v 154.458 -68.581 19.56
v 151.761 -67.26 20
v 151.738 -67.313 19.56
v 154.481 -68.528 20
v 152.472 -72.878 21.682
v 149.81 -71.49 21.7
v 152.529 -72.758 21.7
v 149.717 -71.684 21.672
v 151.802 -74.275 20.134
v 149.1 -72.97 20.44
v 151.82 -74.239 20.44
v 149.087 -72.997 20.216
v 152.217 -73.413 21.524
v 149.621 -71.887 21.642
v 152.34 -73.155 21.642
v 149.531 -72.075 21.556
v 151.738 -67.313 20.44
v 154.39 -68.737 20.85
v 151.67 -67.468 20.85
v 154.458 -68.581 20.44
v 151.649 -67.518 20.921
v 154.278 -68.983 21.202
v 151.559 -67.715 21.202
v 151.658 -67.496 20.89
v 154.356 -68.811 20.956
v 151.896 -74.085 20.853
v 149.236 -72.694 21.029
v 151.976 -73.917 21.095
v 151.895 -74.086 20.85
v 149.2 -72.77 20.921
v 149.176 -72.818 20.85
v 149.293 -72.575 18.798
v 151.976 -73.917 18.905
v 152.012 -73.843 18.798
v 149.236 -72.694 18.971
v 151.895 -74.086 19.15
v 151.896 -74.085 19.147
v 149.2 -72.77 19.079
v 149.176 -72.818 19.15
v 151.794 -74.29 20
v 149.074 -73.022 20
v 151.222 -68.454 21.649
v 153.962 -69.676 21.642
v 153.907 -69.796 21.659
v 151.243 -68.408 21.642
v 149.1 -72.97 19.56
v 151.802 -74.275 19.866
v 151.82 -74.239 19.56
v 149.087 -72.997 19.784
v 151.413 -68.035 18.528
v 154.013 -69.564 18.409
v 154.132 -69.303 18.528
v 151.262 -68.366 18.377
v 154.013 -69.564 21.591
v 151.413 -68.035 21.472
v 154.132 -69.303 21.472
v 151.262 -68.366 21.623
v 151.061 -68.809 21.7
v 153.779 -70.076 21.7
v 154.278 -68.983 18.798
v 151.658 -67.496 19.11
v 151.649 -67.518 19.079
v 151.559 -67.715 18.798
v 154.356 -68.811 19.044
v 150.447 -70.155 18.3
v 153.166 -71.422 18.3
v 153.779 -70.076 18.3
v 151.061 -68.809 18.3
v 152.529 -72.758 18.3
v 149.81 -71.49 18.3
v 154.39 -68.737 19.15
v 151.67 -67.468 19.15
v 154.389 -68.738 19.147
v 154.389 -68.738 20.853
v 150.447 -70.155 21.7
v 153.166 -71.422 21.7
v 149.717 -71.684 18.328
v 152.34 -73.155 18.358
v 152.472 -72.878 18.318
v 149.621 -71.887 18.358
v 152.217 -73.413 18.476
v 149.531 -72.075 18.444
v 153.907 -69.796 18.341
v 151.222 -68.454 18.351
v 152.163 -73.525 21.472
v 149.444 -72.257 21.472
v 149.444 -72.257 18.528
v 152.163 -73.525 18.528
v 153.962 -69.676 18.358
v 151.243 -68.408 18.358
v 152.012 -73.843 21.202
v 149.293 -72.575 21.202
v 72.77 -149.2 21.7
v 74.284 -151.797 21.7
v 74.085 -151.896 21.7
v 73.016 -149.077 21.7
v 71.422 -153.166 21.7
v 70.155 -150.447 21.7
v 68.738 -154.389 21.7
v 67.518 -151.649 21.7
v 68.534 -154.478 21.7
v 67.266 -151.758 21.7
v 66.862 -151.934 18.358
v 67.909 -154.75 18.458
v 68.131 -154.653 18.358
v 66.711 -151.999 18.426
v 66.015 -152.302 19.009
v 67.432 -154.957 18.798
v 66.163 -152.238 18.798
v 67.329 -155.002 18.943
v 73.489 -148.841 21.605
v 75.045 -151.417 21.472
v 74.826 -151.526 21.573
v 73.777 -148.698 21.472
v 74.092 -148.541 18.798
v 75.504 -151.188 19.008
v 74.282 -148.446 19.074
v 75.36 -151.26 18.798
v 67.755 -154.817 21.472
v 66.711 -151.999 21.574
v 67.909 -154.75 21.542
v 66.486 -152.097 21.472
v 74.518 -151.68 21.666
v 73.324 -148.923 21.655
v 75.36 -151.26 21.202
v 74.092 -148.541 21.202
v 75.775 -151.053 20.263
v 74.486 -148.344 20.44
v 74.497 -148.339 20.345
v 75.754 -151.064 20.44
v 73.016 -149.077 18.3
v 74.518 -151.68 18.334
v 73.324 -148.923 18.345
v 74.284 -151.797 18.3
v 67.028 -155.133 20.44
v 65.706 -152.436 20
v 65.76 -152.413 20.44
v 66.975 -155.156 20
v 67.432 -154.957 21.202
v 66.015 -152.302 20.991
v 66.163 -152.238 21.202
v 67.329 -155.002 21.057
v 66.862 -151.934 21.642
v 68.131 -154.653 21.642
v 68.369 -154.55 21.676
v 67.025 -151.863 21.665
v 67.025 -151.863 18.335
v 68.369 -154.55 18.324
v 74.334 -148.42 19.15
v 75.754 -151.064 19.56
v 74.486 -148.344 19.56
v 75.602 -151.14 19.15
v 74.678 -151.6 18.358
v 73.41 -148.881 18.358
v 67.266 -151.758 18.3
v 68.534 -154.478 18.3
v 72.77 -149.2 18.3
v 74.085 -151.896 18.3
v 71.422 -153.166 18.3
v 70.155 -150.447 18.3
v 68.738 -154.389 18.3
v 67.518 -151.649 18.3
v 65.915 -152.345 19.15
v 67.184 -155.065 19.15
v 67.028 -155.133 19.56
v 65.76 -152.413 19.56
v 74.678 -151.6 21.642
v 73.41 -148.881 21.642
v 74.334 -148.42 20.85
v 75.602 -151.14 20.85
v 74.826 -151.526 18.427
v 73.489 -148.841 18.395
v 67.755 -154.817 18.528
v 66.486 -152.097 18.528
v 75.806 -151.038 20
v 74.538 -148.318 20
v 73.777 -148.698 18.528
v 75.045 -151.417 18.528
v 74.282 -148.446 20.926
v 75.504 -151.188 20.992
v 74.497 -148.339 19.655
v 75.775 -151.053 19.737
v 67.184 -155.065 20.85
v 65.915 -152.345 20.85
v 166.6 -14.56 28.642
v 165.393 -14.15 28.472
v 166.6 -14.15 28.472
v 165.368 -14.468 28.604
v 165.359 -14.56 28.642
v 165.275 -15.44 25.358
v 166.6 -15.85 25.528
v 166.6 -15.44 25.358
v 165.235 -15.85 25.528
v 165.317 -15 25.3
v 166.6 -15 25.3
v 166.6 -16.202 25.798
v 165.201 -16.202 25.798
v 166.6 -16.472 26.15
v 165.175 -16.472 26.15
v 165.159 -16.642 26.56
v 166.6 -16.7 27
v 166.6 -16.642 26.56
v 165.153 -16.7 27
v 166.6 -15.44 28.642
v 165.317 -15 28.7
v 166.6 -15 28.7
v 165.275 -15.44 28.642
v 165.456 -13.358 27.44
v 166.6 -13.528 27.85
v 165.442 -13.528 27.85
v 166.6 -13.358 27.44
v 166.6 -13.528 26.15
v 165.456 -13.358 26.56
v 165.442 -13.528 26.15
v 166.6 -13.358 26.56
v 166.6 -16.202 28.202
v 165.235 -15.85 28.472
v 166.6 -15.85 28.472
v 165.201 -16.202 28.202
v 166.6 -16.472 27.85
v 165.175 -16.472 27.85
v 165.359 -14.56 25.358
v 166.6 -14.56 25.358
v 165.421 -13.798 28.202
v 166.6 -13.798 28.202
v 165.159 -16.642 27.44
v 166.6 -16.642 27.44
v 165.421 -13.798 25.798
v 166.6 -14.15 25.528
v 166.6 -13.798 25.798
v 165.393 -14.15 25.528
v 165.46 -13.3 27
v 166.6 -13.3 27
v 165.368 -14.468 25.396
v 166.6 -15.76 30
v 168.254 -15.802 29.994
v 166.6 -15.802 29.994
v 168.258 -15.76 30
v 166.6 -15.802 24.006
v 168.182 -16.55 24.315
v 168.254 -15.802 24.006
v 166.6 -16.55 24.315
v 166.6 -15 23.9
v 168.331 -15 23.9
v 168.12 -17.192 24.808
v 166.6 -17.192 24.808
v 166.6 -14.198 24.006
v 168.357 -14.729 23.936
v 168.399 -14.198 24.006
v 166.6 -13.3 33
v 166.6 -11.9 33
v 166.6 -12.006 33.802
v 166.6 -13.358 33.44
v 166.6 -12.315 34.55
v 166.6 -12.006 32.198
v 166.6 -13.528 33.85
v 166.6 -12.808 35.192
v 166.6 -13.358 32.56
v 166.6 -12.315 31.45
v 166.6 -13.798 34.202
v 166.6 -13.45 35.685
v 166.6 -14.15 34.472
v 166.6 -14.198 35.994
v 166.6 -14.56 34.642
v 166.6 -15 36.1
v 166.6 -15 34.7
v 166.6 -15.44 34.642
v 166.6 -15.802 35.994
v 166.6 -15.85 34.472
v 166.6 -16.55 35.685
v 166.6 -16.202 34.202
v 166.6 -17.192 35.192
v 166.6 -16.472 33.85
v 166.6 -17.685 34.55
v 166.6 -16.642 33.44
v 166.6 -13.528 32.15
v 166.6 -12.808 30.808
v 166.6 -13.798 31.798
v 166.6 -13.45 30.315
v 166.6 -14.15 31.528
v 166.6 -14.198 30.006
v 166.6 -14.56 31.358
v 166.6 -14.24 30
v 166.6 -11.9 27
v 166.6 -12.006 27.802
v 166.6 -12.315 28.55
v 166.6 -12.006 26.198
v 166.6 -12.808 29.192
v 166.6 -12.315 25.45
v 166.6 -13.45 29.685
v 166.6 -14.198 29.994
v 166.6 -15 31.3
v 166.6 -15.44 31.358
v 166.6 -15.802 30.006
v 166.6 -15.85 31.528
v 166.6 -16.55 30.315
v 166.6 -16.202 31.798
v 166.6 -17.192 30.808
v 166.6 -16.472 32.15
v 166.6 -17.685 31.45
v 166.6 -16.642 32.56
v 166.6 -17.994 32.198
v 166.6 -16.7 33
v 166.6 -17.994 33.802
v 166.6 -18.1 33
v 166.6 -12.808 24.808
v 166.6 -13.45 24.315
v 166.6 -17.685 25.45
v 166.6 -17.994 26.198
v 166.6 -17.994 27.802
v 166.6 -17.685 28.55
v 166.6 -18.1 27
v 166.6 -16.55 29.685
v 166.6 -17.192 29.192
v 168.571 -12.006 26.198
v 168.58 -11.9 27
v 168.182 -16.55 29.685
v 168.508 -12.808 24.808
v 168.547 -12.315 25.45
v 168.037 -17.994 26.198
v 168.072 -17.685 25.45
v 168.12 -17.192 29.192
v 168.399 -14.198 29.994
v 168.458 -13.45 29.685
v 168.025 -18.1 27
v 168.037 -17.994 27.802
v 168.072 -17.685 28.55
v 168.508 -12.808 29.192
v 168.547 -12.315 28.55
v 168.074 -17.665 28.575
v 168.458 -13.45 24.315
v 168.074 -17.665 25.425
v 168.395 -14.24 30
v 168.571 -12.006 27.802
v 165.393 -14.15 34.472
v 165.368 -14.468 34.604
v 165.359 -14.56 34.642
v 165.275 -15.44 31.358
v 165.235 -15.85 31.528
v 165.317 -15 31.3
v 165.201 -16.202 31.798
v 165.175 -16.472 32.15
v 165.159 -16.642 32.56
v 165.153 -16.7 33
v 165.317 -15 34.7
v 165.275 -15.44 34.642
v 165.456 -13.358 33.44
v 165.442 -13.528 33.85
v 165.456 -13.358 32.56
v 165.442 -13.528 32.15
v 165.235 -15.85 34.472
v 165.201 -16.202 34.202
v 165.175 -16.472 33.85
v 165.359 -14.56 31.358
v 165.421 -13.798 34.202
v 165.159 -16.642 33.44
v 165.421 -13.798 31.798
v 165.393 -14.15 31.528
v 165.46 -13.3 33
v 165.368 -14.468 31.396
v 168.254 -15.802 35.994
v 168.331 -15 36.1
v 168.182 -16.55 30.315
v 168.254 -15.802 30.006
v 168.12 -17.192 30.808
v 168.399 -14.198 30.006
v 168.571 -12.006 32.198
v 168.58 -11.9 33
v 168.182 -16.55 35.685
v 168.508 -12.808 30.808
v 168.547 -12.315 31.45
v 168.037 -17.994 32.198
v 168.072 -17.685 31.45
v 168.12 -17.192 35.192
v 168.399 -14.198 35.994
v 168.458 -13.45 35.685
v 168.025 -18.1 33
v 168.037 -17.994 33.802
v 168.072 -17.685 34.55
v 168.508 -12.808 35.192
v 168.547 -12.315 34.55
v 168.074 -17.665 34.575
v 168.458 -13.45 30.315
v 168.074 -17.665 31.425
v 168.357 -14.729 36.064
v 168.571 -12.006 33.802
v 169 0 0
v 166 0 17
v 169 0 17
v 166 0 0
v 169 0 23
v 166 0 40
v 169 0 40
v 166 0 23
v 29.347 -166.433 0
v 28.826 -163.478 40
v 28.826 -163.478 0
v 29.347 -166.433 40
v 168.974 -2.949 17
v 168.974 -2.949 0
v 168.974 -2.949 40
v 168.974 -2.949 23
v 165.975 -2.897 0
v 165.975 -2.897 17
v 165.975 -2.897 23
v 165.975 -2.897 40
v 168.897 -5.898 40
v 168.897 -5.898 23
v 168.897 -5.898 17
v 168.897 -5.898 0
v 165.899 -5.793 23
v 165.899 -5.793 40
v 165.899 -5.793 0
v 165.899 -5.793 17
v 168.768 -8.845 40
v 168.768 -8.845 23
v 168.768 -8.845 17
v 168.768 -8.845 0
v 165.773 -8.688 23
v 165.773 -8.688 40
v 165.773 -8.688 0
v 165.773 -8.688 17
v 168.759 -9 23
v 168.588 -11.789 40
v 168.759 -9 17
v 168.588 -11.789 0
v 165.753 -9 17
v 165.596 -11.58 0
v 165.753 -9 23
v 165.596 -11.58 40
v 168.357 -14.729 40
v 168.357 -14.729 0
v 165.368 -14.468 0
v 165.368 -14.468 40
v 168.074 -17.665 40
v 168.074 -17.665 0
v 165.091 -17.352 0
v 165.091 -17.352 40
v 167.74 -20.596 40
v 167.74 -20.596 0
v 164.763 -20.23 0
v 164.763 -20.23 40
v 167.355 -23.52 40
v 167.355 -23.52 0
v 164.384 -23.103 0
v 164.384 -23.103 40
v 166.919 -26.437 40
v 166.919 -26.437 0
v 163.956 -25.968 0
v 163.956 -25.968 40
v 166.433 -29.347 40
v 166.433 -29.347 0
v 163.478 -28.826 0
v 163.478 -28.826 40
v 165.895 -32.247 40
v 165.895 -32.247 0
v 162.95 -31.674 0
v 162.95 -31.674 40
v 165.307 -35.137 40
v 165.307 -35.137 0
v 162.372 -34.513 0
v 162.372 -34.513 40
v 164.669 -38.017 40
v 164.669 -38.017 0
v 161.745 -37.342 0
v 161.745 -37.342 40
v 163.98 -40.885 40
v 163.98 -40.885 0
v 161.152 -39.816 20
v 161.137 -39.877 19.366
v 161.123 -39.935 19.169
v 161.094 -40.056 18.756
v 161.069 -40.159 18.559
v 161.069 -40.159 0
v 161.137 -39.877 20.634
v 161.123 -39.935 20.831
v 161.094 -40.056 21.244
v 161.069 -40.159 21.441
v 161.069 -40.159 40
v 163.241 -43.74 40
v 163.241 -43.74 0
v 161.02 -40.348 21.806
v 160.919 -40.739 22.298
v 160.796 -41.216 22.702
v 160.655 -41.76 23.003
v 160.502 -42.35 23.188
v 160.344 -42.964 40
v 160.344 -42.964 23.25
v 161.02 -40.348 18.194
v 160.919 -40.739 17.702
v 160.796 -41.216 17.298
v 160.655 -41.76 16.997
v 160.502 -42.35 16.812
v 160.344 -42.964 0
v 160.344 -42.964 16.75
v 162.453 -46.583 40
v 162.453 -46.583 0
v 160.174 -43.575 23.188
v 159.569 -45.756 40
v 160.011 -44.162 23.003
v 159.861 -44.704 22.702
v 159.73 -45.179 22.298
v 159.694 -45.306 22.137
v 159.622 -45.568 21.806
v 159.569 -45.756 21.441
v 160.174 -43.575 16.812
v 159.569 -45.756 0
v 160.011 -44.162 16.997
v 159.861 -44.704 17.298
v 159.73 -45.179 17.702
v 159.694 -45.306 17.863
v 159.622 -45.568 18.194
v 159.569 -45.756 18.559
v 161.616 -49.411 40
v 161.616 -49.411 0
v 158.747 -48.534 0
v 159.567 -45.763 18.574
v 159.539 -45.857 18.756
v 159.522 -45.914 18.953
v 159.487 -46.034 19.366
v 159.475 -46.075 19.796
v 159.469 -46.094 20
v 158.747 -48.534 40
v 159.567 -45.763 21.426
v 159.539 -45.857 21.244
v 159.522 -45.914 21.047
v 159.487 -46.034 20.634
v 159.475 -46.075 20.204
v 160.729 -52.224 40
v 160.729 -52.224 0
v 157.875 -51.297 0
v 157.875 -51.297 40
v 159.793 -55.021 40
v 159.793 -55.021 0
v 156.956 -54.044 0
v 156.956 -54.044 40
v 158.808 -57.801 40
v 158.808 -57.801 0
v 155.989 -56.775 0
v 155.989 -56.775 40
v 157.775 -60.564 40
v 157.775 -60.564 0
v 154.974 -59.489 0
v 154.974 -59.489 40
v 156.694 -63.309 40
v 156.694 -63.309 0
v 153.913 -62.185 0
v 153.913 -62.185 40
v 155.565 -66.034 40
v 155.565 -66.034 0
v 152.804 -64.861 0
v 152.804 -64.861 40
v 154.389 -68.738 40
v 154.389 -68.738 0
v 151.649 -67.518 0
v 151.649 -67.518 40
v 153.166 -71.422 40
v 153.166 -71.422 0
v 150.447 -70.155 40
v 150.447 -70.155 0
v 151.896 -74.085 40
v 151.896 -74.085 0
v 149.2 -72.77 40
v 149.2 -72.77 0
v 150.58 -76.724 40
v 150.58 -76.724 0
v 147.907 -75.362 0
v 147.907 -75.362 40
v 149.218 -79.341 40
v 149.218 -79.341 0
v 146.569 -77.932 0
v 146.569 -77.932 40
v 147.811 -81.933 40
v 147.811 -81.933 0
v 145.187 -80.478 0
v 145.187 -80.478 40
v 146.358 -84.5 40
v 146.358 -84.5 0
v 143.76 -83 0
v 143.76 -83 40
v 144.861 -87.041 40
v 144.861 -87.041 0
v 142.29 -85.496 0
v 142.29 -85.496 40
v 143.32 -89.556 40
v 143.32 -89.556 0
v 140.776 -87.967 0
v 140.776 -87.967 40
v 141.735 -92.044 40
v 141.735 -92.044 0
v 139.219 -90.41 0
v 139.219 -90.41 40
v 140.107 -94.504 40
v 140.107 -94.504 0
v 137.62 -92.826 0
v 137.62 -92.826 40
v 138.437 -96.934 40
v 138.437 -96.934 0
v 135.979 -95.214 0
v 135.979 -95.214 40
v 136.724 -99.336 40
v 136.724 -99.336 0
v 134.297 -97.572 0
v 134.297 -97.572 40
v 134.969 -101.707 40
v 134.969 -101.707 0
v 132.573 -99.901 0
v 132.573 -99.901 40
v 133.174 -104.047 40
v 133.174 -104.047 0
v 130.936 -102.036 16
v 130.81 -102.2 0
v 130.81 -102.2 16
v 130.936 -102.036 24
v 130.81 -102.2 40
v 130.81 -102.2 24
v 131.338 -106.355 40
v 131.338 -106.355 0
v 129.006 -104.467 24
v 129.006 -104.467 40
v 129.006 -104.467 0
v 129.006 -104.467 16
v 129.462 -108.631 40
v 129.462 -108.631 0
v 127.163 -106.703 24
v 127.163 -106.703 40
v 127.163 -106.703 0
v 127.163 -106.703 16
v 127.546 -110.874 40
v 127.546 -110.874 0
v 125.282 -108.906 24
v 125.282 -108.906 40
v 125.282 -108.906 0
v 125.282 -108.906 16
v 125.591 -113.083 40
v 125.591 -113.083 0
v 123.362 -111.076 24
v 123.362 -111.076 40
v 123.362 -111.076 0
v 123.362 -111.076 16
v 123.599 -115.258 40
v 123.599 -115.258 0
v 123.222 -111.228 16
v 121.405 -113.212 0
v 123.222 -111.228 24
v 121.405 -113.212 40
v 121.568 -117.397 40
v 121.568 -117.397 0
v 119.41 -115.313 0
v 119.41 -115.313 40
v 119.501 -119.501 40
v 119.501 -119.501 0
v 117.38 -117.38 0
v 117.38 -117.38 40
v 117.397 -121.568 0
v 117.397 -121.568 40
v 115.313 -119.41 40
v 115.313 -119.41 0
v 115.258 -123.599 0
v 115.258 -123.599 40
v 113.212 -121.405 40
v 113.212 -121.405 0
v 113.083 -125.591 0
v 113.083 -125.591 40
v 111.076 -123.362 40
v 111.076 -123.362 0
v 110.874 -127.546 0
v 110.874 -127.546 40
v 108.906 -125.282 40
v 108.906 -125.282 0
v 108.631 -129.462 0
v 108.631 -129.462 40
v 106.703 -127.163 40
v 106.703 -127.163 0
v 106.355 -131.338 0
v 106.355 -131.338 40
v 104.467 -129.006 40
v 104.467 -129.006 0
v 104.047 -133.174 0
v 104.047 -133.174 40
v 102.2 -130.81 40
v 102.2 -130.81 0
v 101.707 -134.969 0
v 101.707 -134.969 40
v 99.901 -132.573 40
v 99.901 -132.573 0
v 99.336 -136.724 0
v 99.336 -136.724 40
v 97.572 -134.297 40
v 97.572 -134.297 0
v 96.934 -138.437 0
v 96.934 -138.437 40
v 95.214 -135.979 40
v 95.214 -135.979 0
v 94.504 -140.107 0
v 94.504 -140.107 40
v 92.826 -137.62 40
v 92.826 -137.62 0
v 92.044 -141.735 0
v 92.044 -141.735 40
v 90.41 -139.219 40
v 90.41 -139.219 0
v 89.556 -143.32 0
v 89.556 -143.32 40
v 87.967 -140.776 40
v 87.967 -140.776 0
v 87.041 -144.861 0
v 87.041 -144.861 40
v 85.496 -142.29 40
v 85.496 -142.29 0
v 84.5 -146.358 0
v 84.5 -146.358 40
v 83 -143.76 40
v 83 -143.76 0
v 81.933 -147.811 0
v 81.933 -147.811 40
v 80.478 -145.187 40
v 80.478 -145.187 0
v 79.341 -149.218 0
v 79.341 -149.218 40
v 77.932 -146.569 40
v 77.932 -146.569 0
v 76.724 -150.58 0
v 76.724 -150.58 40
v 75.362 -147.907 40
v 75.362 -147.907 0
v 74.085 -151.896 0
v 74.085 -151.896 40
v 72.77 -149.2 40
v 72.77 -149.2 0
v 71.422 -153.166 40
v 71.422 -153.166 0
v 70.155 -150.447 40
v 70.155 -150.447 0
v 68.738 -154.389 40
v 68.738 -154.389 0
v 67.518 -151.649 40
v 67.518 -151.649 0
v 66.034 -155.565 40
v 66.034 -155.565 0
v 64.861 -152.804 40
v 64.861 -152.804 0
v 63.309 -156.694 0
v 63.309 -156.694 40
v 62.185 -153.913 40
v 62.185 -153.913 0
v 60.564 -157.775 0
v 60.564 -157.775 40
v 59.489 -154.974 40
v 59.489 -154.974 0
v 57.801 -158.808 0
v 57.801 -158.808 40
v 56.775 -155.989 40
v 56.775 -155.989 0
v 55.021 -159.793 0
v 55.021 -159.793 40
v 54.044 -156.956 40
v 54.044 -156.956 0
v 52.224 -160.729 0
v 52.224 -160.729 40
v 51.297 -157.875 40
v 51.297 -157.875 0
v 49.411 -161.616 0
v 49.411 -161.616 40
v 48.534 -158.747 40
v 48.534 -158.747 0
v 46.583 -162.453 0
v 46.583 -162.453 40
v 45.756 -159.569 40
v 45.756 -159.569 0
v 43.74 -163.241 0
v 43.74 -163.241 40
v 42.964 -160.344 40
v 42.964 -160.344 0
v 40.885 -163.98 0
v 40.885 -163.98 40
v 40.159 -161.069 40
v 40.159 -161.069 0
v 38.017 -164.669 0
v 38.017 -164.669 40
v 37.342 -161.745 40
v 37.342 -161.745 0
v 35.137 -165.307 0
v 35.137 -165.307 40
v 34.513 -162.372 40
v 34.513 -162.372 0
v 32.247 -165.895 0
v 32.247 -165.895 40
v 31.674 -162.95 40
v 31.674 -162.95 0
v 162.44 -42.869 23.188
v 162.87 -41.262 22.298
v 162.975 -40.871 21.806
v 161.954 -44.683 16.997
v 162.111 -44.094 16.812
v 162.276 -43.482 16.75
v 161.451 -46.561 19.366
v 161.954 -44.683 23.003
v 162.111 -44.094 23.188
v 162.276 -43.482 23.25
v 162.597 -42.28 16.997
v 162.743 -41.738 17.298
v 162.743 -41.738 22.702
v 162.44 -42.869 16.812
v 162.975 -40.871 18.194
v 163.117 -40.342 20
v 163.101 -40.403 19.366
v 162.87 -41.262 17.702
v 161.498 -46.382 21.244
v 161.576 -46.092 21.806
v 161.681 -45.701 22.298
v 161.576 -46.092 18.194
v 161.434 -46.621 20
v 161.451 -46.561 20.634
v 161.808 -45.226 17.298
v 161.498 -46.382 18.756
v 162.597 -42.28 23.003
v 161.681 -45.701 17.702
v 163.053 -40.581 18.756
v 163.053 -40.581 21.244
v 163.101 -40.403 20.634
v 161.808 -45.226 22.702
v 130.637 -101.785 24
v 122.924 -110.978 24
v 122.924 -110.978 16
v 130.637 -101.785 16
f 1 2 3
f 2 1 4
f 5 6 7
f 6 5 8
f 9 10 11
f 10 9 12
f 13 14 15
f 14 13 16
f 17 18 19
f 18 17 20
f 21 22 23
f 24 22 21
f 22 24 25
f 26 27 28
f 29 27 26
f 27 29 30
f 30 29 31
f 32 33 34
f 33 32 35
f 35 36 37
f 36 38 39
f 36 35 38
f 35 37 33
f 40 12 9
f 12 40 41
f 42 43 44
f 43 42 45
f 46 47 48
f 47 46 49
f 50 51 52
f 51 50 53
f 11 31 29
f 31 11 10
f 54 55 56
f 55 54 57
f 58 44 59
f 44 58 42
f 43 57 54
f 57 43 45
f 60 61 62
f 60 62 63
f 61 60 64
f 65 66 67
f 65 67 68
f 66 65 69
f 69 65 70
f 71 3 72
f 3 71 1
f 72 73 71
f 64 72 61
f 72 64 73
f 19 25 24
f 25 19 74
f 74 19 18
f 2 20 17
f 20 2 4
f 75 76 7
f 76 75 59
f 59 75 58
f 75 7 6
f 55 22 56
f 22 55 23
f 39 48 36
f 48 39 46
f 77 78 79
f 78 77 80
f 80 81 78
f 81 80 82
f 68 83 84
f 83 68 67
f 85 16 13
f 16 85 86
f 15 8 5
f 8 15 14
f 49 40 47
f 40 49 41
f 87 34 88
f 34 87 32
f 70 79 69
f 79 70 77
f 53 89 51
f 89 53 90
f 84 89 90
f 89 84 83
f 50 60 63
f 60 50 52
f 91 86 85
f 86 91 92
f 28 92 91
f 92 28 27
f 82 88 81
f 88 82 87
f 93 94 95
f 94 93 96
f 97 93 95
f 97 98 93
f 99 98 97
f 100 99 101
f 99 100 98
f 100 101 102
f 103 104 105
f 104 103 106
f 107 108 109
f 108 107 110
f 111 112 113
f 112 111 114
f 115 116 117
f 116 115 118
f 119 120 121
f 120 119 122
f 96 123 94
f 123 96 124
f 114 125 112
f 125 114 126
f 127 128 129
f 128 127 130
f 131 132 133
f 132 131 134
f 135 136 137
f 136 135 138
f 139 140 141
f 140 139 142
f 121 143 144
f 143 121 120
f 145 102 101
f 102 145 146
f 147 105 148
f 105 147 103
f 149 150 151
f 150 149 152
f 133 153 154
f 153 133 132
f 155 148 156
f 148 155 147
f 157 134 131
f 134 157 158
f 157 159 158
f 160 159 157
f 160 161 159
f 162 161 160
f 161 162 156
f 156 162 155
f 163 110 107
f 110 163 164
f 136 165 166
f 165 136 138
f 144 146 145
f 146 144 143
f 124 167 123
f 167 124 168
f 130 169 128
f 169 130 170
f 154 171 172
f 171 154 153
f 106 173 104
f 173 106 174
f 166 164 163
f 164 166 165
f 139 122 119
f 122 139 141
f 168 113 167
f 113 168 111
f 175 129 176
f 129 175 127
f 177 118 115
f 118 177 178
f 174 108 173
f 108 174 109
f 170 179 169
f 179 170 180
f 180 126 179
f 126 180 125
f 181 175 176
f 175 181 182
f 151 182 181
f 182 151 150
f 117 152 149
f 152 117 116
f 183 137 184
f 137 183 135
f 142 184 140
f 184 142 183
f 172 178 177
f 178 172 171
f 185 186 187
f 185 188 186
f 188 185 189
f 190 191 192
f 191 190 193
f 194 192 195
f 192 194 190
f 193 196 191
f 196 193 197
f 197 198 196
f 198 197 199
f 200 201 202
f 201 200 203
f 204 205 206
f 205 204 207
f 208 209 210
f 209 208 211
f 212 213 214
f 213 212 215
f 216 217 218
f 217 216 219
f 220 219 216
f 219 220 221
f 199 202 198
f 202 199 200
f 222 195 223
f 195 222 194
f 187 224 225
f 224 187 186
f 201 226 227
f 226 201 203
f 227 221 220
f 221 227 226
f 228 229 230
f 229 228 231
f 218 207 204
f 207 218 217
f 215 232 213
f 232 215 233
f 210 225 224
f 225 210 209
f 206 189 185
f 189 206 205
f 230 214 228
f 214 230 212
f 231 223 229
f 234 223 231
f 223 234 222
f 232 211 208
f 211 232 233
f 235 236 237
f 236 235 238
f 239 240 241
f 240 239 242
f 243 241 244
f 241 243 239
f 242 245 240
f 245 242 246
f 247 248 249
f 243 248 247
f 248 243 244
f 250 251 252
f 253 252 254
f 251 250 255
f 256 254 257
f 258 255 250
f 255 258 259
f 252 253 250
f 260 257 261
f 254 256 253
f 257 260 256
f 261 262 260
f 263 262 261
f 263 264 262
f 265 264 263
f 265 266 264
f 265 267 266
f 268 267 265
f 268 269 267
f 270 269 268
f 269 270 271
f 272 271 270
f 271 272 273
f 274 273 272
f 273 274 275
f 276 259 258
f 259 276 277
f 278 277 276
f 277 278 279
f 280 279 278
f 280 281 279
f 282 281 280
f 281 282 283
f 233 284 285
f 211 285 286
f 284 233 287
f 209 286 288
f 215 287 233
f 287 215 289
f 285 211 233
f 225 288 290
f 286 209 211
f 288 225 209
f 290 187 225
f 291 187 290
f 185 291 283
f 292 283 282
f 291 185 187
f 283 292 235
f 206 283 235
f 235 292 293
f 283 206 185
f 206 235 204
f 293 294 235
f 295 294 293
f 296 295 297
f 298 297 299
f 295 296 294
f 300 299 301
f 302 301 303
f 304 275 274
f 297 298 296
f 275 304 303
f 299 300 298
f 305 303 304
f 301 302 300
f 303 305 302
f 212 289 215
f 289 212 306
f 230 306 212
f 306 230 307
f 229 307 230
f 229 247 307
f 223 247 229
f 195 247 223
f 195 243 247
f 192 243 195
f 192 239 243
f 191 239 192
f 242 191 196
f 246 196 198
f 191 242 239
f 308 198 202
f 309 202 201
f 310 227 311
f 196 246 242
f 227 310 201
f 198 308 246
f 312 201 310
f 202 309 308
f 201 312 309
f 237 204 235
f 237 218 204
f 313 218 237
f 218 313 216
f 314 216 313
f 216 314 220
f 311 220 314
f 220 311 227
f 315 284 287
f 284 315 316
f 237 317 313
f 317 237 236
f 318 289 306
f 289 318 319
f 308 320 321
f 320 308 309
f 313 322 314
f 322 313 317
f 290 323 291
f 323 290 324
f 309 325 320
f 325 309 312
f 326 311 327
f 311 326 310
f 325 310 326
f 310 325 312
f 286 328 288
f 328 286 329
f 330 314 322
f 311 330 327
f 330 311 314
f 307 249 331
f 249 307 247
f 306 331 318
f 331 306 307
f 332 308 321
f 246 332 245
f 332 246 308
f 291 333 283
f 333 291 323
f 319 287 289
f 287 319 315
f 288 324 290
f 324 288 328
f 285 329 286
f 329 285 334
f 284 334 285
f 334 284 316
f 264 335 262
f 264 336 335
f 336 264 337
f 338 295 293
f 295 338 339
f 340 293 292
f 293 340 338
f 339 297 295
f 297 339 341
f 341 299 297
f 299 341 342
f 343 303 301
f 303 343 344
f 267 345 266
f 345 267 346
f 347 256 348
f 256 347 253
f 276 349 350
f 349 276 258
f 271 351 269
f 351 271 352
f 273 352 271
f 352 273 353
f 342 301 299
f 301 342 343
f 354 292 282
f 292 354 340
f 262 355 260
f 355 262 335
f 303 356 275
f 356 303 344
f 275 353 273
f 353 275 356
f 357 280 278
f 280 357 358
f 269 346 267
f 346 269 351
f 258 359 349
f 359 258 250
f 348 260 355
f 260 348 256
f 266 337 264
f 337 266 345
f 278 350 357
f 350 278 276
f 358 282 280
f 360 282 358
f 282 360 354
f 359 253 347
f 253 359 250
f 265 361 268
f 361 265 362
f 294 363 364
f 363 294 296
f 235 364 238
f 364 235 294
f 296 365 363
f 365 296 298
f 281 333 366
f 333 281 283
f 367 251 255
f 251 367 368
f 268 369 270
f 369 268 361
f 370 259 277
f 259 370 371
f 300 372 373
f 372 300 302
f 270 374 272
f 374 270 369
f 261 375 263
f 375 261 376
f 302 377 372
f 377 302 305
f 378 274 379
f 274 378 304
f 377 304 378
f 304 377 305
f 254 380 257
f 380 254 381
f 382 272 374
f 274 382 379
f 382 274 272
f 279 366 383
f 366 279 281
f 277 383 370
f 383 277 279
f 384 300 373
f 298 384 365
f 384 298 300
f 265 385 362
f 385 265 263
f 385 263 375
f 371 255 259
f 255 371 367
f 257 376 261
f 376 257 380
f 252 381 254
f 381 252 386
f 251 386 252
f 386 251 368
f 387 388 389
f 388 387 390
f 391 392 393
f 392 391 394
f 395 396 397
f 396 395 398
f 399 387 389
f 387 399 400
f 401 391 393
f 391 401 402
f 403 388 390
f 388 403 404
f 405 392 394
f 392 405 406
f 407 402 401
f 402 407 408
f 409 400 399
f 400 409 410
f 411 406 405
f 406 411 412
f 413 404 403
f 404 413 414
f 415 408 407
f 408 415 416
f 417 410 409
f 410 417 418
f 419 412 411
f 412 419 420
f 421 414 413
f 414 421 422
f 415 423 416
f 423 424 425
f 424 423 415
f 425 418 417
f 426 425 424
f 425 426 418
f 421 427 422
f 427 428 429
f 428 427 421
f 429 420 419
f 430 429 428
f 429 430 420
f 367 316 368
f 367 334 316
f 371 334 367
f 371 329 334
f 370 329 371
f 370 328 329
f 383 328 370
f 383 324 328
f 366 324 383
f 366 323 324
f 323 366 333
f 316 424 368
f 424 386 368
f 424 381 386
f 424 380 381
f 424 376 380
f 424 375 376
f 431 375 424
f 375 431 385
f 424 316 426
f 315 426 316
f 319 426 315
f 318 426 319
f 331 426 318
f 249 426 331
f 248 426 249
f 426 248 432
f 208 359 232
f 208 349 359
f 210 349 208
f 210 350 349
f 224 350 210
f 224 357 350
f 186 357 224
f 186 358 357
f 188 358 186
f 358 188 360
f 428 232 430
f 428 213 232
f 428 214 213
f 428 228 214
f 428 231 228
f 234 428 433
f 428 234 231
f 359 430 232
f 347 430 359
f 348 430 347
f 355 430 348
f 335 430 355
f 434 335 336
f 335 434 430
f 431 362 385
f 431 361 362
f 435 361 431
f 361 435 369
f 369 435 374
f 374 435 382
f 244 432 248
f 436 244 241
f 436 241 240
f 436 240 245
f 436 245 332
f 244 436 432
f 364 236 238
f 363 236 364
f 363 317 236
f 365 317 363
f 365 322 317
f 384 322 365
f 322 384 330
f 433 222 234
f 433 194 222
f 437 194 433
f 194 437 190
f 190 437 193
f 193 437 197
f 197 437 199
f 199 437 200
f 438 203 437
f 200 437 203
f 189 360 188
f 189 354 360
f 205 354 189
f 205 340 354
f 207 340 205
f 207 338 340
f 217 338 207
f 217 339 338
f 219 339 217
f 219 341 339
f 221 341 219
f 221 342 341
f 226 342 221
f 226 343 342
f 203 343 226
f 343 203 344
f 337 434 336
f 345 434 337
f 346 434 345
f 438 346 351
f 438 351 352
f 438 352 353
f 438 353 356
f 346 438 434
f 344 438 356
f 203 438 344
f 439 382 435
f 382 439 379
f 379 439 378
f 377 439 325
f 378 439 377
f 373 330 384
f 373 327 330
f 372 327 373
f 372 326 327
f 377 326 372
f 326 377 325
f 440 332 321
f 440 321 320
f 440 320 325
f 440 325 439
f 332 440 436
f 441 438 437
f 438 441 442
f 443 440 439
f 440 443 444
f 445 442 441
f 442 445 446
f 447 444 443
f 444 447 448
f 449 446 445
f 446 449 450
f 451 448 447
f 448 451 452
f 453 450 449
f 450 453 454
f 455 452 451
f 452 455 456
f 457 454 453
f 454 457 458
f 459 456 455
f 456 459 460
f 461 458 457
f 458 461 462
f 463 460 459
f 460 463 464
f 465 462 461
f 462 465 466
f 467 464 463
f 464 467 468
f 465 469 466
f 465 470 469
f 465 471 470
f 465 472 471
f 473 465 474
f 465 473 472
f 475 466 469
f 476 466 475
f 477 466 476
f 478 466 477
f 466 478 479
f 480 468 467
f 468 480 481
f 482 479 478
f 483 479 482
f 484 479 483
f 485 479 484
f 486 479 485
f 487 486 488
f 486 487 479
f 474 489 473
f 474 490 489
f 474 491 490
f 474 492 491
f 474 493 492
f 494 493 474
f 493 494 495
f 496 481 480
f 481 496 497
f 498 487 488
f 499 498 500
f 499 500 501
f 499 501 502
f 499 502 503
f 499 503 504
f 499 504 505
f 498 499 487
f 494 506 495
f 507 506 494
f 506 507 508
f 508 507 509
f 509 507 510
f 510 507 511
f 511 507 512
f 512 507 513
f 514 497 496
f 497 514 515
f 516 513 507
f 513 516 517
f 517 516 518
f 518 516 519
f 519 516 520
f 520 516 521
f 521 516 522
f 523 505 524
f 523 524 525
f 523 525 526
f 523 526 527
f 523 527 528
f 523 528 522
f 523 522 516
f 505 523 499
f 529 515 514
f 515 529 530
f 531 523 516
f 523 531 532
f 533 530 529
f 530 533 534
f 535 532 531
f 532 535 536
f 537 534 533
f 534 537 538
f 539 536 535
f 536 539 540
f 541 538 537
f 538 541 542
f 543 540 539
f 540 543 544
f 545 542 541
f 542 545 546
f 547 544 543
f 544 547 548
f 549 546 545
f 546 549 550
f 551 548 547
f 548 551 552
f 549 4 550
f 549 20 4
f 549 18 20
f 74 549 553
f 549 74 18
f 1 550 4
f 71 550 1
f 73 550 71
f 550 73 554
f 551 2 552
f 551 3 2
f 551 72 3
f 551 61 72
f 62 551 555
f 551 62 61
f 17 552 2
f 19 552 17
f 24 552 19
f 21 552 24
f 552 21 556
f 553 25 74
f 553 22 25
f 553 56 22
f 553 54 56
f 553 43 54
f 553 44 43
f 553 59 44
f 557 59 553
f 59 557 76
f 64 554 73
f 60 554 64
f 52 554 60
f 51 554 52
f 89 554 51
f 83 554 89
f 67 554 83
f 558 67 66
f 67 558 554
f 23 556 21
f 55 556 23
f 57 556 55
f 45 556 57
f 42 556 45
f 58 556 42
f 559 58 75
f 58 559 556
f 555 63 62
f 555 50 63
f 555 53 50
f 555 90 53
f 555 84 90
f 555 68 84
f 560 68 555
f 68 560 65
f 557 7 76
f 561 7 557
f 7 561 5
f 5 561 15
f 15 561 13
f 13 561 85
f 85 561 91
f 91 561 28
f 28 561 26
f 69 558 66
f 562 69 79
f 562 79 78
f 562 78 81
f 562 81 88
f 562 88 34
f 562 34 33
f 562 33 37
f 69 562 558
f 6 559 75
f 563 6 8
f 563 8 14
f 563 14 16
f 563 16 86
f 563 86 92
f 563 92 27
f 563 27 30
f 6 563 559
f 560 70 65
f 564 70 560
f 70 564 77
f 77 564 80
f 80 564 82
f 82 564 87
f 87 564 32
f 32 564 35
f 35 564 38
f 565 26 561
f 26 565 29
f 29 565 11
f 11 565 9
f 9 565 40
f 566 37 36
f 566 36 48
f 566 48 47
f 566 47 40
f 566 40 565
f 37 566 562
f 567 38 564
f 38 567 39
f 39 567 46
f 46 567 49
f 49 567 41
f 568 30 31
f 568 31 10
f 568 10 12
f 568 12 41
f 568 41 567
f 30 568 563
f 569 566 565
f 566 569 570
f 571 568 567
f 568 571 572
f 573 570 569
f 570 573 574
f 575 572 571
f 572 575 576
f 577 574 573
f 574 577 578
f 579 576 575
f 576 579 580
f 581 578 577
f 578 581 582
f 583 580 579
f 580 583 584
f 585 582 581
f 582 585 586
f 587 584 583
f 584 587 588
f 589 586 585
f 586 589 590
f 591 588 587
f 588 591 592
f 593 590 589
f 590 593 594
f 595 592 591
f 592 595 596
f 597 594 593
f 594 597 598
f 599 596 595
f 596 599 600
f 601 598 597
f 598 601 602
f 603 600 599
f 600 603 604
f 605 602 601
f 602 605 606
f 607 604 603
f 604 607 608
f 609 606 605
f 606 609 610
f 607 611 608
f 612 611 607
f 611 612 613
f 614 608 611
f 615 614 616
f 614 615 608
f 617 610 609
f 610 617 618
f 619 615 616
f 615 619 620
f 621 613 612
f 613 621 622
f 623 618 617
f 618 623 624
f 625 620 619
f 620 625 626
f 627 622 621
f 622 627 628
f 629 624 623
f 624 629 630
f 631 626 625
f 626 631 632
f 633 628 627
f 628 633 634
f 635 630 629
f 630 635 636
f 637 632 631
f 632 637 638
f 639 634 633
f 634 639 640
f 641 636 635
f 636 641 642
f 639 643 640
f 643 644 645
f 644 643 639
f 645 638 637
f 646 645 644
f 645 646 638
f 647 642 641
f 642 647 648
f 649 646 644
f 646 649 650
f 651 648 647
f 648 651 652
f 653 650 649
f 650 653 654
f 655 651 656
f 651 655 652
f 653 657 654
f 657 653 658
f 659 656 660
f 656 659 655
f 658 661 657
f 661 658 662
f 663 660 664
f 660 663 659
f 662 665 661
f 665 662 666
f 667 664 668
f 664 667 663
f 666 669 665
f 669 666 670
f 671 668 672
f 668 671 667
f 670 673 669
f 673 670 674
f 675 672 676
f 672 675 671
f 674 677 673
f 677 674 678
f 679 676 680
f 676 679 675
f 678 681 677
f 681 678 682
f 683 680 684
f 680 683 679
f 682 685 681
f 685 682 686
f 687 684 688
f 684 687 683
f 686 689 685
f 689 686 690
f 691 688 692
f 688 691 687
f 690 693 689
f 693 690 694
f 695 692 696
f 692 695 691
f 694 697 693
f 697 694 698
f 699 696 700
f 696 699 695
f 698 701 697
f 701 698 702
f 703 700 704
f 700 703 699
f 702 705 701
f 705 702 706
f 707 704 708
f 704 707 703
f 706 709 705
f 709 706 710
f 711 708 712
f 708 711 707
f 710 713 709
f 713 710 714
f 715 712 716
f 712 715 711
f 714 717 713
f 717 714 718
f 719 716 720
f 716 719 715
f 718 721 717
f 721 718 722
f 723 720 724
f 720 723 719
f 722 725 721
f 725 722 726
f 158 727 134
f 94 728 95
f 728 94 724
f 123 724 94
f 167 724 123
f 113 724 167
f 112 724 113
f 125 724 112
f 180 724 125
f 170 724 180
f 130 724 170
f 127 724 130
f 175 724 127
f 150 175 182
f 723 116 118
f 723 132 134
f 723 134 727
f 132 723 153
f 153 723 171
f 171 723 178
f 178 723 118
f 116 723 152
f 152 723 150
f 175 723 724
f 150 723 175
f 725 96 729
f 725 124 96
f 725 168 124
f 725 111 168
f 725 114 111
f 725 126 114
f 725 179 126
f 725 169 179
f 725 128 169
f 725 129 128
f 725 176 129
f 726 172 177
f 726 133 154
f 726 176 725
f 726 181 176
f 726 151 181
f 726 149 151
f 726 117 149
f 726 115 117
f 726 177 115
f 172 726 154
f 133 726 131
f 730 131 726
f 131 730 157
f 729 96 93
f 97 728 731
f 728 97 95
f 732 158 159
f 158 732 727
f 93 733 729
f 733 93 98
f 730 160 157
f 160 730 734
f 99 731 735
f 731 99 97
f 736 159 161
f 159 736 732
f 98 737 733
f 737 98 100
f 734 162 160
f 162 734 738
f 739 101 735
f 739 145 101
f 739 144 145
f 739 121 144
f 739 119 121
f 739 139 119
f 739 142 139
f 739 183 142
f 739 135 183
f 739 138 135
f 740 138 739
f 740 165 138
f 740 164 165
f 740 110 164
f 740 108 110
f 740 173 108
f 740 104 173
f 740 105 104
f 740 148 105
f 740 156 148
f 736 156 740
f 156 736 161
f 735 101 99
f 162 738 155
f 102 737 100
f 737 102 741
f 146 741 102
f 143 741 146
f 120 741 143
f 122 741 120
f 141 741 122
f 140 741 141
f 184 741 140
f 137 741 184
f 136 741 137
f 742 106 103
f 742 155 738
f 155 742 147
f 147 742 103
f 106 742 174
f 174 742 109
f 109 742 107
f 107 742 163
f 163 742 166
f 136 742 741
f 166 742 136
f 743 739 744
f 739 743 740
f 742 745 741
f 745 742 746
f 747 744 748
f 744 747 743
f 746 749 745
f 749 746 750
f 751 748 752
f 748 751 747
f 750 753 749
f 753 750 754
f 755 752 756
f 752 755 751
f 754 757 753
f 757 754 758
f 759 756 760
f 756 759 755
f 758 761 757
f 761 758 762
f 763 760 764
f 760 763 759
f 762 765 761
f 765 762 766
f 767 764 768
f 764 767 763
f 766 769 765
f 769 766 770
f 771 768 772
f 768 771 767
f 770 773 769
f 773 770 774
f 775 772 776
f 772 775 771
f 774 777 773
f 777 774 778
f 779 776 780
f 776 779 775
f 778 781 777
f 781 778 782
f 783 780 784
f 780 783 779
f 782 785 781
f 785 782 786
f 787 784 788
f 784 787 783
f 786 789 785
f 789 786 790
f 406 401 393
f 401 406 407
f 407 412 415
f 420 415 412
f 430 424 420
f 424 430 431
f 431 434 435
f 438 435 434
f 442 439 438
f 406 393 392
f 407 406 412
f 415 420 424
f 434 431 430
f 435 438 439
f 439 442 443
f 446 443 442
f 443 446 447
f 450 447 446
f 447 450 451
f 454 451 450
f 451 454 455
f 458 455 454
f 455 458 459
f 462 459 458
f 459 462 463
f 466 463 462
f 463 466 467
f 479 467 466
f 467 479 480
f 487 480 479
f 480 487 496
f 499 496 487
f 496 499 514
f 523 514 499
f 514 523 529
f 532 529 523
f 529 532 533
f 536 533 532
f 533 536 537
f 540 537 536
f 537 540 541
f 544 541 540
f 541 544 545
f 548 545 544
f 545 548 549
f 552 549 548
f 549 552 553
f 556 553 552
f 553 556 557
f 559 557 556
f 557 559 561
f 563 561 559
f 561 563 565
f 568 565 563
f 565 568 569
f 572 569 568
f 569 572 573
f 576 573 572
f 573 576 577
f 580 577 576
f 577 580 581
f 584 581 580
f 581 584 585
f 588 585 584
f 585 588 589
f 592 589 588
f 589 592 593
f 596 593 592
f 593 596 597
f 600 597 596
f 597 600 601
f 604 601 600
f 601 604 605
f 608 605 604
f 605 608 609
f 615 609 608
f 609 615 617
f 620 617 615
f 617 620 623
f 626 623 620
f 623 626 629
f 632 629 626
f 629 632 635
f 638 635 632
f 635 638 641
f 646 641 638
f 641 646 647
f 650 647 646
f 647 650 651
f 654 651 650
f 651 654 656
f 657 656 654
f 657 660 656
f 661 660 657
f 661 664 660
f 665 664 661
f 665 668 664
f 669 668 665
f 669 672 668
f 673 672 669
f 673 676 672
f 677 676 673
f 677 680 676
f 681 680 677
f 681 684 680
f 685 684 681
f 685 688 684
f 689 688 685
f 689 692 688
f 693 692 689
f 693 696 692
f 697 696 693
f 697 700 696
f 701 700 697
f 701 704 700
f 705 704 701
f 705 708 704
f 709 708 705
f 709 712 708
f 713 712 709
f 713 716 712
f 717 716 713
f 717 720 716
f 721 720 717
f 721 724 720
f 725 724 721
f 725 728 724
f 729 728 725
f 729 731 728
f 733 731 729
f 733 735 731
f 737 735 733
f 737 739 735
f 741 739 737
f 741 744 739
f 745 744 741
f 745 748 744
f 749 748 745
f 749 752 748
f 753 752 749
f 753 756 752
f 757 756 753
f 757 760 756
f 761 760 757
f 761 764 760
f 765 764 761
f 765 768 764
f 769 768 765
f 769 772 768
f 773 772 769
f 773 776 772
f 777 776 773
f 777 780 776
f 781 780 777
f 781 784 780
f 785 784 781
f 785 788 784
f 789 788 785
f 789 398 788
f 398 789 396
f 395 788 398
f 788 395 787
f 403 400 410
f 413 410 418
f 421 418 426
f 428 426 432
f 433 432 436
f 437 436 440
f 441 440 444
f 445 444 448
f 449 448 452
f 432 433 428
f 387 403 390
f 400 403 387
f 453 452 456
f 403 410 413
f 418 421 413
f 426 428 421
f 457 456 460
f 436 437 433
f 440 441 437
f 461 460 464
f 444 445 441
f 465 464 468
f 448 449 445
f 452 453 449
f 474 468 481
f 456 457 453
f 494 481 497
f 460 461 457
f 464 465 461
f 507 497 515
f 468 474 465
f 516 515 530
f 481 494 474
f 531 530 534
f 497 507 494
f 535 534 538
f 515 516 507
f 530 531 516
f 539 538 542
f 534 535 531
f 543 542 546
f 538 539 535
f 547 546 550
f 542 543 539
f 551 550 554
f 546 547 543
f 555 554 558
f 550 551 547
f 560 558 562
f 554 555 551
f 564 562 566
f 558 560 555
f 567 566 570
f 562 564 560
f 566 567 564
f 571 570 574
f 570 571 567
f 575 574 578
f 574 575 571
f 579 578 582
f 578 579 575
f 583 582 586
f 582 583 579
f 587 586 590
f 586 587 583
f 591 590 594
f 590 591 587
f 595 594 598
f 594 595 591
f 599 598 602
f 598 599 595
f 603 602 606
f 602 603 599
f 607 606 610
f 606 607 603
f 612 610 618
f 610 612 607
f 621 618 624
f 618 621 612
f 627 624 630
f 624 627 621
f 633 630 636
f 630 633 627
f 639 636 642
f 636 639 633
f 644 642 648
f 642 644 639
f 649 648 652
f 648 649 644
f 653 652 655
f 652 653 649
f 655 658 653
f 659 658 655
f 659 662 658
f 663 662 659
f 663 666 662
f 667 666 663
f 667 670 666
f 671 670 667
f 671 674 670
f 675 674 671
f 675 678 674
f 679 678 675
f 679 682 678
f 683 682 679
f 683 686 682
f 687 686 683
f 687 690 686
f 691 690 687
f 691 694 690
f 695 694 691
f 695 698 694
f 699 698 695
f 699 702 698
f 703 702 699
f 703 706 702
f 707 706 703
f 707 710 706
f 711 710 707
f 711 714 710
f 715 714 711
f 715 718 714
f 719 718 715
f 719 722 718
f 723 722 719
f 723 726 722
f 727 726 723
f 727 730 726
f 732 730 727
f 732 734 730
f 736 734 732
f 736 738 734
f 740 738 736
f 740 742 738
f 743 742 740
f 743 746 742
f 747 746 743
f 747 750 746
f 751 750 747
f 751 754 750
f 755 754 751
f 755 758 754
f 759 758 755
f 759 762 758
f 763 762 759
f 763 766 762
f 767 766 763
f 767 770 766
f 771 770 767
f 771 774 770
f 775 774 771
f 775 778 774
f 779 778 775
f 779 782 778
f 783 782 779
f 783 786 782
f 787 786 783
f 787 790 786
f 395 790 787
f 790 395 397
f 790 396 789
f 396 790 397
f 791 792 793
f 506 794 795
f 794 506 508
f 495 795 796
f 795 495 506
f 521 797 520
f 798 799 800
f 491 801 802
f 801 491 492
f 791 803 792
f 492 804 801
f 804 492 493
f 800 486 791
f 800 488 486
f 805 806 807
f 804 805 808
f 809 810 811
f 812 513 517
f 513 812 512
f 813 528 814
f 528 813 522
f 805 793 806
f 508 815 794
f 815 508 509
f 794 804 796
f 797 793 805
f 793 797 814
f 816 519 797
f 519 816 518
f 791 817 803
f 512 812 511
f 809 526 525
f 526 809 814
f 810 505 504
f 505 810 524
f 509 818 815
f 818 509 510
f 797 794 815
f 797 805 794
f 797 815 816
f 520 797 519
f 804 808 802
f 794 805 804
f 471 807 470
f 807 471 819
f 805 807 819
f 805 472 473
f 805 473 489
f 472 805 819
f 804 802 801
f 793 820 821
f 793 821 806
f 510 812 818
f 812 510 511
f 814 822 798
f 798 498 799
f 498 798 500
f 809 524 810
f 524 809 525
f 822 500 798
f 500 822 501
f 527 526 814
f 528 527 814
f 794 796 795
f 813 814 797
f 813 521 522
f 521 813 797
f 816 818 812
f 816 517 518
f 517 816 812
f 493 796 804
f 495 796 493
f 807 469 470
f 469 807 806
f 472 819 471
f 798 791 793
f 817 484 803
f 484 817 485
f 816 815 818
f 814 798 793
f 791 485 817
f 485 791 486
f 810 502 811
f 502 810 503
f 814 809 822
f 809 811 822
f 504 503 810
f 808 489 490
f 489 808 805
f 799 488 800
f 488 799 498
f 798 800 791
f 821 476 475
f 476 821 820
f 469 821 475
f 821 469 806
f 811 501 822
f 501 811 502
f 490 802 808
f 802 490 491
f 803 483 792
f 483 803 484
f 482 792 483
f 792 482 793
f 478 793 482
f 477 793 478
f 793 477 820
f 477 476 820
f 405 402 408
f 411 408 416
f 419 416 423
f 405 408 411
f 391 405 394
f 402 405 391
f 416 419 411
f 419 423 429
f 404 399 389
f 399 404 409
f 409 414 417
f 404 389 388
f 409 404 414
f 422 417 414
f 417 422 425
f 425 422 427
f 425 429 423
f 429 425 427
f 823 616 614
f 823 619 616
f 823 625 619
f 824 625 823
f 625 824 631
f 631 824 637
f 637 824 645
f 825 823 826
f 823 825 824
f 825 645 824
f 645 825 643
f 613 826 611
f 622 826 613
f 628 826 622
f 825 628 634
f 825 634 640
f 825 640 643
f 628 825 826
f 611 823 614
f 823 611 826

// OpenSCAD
// file: robot_bumper_left.scad
// =====================================================================
//  robot base :: front bumper, LEFT half 0 .. +80 deg (print 1; right half = mirror)
//  Band r 166 .. 169, z 22 .. 62 (the legacy model's front half-ring band).
//    - 2 slots (3.4 x 10.4, long along X) at 25 / 65 deg, z 42 for radial M3 shoulder screws
//    - spring seat d 6.5 x 2 deep (radial) on the inner face at 15 deg, z 42
//    - switch strike pad on the inner face at 40 deg (12 tangential x 8 tall, 0.5 proud: 0.1 off the switch lever tip at rest)
//    - ToF window 18 x 6 at 0 deg split across both halves (9 per half), z 42
//    - splice plate screws: 2x M3 (z 49 / 55) at y +15, counterbored 6.2 x 2 on the outer face,
//      M3 along X into robot_bumper_splice (M3x8).
//  Print orientation: standing on its bottom edge (band vertical), no supports.
//  robot_bumper_left()  robot frame.   NOTE: the lid wall needs a ToF window and a relief for
//  the splice plate at 0 deg (see report).
// =====================================================================
include <../lib/params.scad>
include <../lib/robot_params.scad>

rbb_ri = rb_bumper_r[0];  rbb_ro = rb_bumper_r[1];
rbb_z0 = rb_bumper_z[0];  rbb_z1 = rb_bumper_z[1];
rbb_mid = rb_bumper_mid_z;
rbb_slot_len = rb_bumper_travel + 6.4;
rbb_splice_y = 15;  rbb_splice_z = [49, 55];

module rbb_left_body() {
    difference() {
        rotate_extrude(angle = rb_bumper_ang, $fn = 360)
            translate([rbb_ri, rbb_z0]) square([rbb_ro - rbb_ri, rbb_z1 - rbb_z0]);
        // M3 shoulder-screw slots (hull of 2 radial cylinders, ends along X)
        for (a = [25, 65]) {
            pt = rbb_ro * [cos(a), sin(a)];
            hull() for (s = [-1, 1])
                translate([pt[0] + s * (rbb_slot_len - 3.4) / 2, pt[1], rbb_mid])
                    rotate([0, 90, a]) translate([0, 0, -8]) cylinder(h = 16, d = 3.4, $fn = 24);
        }
        // spring seat (radial pocket on the inner face)
        rotate([0, 0, 15]) translate([rbb_ri - 1, 0, rbb_mid]) rotate([0, 90, 0]) cylinder(h = 3, d = 6.5, $fn = 32);
        // ToF window half
        translate([rbb_ri - 1, -0.01, rbb_mid - 3]) cube([rbb_ro - rbb_ri + 2, 9.01, 6]);
        // splice screws (counterbored from outside)
        for (z = rbb_splice_z) translate([0, rbb_splice_y, z]) rotate([0, 90, 0]) {
            translate([0, 0, rbb_ri - 2]) cylinder(h = 6, d = m3_clear, $fn = 24);
            translate([0, 0, 166.6]) cylinder(h = 6, d = 6.2, $fn = 24);
        }
    }
    // strike pad
    intersection() {
        rotate([0, 0, 40]) translate([rbb_ri - 0.5, -6, rbb_mid - 4]) cube([1.5, 12, 8]);
        cylinder(h = 100, r = 200);
    }
}

module robot_bumper_left() { rbb_left_body(); }
module robot_bumper_left_print() { translate([0, 0, -rbb_z0]) robot_bumper_left(); }

robot_bumper_left_print();
// main file
// =====================================================================
//  robot base :: front bumper, RIGHT half -80 .. 0 deg (print 1)
//  Exact mirror (Y) of parts/robot_bumper_left.scad: see that file.
//  Print orientation: standing on its bottom edge, no supports.
//  robot_bumper_right()  robot frame.
// =====================================================================
include <../lib/params.scad>
include <../lib/robot_params.scad>
use <robot_bumper_left.scad>

module robot_bumper_right() { mirror([0, 1, 0]) robot_bumper_left(); }
module robot_bumper_right_print() { translate([0, 0, -rb_bumper_z[0]]) robot_bumper_right(); }

robot_bumper_right_print();
